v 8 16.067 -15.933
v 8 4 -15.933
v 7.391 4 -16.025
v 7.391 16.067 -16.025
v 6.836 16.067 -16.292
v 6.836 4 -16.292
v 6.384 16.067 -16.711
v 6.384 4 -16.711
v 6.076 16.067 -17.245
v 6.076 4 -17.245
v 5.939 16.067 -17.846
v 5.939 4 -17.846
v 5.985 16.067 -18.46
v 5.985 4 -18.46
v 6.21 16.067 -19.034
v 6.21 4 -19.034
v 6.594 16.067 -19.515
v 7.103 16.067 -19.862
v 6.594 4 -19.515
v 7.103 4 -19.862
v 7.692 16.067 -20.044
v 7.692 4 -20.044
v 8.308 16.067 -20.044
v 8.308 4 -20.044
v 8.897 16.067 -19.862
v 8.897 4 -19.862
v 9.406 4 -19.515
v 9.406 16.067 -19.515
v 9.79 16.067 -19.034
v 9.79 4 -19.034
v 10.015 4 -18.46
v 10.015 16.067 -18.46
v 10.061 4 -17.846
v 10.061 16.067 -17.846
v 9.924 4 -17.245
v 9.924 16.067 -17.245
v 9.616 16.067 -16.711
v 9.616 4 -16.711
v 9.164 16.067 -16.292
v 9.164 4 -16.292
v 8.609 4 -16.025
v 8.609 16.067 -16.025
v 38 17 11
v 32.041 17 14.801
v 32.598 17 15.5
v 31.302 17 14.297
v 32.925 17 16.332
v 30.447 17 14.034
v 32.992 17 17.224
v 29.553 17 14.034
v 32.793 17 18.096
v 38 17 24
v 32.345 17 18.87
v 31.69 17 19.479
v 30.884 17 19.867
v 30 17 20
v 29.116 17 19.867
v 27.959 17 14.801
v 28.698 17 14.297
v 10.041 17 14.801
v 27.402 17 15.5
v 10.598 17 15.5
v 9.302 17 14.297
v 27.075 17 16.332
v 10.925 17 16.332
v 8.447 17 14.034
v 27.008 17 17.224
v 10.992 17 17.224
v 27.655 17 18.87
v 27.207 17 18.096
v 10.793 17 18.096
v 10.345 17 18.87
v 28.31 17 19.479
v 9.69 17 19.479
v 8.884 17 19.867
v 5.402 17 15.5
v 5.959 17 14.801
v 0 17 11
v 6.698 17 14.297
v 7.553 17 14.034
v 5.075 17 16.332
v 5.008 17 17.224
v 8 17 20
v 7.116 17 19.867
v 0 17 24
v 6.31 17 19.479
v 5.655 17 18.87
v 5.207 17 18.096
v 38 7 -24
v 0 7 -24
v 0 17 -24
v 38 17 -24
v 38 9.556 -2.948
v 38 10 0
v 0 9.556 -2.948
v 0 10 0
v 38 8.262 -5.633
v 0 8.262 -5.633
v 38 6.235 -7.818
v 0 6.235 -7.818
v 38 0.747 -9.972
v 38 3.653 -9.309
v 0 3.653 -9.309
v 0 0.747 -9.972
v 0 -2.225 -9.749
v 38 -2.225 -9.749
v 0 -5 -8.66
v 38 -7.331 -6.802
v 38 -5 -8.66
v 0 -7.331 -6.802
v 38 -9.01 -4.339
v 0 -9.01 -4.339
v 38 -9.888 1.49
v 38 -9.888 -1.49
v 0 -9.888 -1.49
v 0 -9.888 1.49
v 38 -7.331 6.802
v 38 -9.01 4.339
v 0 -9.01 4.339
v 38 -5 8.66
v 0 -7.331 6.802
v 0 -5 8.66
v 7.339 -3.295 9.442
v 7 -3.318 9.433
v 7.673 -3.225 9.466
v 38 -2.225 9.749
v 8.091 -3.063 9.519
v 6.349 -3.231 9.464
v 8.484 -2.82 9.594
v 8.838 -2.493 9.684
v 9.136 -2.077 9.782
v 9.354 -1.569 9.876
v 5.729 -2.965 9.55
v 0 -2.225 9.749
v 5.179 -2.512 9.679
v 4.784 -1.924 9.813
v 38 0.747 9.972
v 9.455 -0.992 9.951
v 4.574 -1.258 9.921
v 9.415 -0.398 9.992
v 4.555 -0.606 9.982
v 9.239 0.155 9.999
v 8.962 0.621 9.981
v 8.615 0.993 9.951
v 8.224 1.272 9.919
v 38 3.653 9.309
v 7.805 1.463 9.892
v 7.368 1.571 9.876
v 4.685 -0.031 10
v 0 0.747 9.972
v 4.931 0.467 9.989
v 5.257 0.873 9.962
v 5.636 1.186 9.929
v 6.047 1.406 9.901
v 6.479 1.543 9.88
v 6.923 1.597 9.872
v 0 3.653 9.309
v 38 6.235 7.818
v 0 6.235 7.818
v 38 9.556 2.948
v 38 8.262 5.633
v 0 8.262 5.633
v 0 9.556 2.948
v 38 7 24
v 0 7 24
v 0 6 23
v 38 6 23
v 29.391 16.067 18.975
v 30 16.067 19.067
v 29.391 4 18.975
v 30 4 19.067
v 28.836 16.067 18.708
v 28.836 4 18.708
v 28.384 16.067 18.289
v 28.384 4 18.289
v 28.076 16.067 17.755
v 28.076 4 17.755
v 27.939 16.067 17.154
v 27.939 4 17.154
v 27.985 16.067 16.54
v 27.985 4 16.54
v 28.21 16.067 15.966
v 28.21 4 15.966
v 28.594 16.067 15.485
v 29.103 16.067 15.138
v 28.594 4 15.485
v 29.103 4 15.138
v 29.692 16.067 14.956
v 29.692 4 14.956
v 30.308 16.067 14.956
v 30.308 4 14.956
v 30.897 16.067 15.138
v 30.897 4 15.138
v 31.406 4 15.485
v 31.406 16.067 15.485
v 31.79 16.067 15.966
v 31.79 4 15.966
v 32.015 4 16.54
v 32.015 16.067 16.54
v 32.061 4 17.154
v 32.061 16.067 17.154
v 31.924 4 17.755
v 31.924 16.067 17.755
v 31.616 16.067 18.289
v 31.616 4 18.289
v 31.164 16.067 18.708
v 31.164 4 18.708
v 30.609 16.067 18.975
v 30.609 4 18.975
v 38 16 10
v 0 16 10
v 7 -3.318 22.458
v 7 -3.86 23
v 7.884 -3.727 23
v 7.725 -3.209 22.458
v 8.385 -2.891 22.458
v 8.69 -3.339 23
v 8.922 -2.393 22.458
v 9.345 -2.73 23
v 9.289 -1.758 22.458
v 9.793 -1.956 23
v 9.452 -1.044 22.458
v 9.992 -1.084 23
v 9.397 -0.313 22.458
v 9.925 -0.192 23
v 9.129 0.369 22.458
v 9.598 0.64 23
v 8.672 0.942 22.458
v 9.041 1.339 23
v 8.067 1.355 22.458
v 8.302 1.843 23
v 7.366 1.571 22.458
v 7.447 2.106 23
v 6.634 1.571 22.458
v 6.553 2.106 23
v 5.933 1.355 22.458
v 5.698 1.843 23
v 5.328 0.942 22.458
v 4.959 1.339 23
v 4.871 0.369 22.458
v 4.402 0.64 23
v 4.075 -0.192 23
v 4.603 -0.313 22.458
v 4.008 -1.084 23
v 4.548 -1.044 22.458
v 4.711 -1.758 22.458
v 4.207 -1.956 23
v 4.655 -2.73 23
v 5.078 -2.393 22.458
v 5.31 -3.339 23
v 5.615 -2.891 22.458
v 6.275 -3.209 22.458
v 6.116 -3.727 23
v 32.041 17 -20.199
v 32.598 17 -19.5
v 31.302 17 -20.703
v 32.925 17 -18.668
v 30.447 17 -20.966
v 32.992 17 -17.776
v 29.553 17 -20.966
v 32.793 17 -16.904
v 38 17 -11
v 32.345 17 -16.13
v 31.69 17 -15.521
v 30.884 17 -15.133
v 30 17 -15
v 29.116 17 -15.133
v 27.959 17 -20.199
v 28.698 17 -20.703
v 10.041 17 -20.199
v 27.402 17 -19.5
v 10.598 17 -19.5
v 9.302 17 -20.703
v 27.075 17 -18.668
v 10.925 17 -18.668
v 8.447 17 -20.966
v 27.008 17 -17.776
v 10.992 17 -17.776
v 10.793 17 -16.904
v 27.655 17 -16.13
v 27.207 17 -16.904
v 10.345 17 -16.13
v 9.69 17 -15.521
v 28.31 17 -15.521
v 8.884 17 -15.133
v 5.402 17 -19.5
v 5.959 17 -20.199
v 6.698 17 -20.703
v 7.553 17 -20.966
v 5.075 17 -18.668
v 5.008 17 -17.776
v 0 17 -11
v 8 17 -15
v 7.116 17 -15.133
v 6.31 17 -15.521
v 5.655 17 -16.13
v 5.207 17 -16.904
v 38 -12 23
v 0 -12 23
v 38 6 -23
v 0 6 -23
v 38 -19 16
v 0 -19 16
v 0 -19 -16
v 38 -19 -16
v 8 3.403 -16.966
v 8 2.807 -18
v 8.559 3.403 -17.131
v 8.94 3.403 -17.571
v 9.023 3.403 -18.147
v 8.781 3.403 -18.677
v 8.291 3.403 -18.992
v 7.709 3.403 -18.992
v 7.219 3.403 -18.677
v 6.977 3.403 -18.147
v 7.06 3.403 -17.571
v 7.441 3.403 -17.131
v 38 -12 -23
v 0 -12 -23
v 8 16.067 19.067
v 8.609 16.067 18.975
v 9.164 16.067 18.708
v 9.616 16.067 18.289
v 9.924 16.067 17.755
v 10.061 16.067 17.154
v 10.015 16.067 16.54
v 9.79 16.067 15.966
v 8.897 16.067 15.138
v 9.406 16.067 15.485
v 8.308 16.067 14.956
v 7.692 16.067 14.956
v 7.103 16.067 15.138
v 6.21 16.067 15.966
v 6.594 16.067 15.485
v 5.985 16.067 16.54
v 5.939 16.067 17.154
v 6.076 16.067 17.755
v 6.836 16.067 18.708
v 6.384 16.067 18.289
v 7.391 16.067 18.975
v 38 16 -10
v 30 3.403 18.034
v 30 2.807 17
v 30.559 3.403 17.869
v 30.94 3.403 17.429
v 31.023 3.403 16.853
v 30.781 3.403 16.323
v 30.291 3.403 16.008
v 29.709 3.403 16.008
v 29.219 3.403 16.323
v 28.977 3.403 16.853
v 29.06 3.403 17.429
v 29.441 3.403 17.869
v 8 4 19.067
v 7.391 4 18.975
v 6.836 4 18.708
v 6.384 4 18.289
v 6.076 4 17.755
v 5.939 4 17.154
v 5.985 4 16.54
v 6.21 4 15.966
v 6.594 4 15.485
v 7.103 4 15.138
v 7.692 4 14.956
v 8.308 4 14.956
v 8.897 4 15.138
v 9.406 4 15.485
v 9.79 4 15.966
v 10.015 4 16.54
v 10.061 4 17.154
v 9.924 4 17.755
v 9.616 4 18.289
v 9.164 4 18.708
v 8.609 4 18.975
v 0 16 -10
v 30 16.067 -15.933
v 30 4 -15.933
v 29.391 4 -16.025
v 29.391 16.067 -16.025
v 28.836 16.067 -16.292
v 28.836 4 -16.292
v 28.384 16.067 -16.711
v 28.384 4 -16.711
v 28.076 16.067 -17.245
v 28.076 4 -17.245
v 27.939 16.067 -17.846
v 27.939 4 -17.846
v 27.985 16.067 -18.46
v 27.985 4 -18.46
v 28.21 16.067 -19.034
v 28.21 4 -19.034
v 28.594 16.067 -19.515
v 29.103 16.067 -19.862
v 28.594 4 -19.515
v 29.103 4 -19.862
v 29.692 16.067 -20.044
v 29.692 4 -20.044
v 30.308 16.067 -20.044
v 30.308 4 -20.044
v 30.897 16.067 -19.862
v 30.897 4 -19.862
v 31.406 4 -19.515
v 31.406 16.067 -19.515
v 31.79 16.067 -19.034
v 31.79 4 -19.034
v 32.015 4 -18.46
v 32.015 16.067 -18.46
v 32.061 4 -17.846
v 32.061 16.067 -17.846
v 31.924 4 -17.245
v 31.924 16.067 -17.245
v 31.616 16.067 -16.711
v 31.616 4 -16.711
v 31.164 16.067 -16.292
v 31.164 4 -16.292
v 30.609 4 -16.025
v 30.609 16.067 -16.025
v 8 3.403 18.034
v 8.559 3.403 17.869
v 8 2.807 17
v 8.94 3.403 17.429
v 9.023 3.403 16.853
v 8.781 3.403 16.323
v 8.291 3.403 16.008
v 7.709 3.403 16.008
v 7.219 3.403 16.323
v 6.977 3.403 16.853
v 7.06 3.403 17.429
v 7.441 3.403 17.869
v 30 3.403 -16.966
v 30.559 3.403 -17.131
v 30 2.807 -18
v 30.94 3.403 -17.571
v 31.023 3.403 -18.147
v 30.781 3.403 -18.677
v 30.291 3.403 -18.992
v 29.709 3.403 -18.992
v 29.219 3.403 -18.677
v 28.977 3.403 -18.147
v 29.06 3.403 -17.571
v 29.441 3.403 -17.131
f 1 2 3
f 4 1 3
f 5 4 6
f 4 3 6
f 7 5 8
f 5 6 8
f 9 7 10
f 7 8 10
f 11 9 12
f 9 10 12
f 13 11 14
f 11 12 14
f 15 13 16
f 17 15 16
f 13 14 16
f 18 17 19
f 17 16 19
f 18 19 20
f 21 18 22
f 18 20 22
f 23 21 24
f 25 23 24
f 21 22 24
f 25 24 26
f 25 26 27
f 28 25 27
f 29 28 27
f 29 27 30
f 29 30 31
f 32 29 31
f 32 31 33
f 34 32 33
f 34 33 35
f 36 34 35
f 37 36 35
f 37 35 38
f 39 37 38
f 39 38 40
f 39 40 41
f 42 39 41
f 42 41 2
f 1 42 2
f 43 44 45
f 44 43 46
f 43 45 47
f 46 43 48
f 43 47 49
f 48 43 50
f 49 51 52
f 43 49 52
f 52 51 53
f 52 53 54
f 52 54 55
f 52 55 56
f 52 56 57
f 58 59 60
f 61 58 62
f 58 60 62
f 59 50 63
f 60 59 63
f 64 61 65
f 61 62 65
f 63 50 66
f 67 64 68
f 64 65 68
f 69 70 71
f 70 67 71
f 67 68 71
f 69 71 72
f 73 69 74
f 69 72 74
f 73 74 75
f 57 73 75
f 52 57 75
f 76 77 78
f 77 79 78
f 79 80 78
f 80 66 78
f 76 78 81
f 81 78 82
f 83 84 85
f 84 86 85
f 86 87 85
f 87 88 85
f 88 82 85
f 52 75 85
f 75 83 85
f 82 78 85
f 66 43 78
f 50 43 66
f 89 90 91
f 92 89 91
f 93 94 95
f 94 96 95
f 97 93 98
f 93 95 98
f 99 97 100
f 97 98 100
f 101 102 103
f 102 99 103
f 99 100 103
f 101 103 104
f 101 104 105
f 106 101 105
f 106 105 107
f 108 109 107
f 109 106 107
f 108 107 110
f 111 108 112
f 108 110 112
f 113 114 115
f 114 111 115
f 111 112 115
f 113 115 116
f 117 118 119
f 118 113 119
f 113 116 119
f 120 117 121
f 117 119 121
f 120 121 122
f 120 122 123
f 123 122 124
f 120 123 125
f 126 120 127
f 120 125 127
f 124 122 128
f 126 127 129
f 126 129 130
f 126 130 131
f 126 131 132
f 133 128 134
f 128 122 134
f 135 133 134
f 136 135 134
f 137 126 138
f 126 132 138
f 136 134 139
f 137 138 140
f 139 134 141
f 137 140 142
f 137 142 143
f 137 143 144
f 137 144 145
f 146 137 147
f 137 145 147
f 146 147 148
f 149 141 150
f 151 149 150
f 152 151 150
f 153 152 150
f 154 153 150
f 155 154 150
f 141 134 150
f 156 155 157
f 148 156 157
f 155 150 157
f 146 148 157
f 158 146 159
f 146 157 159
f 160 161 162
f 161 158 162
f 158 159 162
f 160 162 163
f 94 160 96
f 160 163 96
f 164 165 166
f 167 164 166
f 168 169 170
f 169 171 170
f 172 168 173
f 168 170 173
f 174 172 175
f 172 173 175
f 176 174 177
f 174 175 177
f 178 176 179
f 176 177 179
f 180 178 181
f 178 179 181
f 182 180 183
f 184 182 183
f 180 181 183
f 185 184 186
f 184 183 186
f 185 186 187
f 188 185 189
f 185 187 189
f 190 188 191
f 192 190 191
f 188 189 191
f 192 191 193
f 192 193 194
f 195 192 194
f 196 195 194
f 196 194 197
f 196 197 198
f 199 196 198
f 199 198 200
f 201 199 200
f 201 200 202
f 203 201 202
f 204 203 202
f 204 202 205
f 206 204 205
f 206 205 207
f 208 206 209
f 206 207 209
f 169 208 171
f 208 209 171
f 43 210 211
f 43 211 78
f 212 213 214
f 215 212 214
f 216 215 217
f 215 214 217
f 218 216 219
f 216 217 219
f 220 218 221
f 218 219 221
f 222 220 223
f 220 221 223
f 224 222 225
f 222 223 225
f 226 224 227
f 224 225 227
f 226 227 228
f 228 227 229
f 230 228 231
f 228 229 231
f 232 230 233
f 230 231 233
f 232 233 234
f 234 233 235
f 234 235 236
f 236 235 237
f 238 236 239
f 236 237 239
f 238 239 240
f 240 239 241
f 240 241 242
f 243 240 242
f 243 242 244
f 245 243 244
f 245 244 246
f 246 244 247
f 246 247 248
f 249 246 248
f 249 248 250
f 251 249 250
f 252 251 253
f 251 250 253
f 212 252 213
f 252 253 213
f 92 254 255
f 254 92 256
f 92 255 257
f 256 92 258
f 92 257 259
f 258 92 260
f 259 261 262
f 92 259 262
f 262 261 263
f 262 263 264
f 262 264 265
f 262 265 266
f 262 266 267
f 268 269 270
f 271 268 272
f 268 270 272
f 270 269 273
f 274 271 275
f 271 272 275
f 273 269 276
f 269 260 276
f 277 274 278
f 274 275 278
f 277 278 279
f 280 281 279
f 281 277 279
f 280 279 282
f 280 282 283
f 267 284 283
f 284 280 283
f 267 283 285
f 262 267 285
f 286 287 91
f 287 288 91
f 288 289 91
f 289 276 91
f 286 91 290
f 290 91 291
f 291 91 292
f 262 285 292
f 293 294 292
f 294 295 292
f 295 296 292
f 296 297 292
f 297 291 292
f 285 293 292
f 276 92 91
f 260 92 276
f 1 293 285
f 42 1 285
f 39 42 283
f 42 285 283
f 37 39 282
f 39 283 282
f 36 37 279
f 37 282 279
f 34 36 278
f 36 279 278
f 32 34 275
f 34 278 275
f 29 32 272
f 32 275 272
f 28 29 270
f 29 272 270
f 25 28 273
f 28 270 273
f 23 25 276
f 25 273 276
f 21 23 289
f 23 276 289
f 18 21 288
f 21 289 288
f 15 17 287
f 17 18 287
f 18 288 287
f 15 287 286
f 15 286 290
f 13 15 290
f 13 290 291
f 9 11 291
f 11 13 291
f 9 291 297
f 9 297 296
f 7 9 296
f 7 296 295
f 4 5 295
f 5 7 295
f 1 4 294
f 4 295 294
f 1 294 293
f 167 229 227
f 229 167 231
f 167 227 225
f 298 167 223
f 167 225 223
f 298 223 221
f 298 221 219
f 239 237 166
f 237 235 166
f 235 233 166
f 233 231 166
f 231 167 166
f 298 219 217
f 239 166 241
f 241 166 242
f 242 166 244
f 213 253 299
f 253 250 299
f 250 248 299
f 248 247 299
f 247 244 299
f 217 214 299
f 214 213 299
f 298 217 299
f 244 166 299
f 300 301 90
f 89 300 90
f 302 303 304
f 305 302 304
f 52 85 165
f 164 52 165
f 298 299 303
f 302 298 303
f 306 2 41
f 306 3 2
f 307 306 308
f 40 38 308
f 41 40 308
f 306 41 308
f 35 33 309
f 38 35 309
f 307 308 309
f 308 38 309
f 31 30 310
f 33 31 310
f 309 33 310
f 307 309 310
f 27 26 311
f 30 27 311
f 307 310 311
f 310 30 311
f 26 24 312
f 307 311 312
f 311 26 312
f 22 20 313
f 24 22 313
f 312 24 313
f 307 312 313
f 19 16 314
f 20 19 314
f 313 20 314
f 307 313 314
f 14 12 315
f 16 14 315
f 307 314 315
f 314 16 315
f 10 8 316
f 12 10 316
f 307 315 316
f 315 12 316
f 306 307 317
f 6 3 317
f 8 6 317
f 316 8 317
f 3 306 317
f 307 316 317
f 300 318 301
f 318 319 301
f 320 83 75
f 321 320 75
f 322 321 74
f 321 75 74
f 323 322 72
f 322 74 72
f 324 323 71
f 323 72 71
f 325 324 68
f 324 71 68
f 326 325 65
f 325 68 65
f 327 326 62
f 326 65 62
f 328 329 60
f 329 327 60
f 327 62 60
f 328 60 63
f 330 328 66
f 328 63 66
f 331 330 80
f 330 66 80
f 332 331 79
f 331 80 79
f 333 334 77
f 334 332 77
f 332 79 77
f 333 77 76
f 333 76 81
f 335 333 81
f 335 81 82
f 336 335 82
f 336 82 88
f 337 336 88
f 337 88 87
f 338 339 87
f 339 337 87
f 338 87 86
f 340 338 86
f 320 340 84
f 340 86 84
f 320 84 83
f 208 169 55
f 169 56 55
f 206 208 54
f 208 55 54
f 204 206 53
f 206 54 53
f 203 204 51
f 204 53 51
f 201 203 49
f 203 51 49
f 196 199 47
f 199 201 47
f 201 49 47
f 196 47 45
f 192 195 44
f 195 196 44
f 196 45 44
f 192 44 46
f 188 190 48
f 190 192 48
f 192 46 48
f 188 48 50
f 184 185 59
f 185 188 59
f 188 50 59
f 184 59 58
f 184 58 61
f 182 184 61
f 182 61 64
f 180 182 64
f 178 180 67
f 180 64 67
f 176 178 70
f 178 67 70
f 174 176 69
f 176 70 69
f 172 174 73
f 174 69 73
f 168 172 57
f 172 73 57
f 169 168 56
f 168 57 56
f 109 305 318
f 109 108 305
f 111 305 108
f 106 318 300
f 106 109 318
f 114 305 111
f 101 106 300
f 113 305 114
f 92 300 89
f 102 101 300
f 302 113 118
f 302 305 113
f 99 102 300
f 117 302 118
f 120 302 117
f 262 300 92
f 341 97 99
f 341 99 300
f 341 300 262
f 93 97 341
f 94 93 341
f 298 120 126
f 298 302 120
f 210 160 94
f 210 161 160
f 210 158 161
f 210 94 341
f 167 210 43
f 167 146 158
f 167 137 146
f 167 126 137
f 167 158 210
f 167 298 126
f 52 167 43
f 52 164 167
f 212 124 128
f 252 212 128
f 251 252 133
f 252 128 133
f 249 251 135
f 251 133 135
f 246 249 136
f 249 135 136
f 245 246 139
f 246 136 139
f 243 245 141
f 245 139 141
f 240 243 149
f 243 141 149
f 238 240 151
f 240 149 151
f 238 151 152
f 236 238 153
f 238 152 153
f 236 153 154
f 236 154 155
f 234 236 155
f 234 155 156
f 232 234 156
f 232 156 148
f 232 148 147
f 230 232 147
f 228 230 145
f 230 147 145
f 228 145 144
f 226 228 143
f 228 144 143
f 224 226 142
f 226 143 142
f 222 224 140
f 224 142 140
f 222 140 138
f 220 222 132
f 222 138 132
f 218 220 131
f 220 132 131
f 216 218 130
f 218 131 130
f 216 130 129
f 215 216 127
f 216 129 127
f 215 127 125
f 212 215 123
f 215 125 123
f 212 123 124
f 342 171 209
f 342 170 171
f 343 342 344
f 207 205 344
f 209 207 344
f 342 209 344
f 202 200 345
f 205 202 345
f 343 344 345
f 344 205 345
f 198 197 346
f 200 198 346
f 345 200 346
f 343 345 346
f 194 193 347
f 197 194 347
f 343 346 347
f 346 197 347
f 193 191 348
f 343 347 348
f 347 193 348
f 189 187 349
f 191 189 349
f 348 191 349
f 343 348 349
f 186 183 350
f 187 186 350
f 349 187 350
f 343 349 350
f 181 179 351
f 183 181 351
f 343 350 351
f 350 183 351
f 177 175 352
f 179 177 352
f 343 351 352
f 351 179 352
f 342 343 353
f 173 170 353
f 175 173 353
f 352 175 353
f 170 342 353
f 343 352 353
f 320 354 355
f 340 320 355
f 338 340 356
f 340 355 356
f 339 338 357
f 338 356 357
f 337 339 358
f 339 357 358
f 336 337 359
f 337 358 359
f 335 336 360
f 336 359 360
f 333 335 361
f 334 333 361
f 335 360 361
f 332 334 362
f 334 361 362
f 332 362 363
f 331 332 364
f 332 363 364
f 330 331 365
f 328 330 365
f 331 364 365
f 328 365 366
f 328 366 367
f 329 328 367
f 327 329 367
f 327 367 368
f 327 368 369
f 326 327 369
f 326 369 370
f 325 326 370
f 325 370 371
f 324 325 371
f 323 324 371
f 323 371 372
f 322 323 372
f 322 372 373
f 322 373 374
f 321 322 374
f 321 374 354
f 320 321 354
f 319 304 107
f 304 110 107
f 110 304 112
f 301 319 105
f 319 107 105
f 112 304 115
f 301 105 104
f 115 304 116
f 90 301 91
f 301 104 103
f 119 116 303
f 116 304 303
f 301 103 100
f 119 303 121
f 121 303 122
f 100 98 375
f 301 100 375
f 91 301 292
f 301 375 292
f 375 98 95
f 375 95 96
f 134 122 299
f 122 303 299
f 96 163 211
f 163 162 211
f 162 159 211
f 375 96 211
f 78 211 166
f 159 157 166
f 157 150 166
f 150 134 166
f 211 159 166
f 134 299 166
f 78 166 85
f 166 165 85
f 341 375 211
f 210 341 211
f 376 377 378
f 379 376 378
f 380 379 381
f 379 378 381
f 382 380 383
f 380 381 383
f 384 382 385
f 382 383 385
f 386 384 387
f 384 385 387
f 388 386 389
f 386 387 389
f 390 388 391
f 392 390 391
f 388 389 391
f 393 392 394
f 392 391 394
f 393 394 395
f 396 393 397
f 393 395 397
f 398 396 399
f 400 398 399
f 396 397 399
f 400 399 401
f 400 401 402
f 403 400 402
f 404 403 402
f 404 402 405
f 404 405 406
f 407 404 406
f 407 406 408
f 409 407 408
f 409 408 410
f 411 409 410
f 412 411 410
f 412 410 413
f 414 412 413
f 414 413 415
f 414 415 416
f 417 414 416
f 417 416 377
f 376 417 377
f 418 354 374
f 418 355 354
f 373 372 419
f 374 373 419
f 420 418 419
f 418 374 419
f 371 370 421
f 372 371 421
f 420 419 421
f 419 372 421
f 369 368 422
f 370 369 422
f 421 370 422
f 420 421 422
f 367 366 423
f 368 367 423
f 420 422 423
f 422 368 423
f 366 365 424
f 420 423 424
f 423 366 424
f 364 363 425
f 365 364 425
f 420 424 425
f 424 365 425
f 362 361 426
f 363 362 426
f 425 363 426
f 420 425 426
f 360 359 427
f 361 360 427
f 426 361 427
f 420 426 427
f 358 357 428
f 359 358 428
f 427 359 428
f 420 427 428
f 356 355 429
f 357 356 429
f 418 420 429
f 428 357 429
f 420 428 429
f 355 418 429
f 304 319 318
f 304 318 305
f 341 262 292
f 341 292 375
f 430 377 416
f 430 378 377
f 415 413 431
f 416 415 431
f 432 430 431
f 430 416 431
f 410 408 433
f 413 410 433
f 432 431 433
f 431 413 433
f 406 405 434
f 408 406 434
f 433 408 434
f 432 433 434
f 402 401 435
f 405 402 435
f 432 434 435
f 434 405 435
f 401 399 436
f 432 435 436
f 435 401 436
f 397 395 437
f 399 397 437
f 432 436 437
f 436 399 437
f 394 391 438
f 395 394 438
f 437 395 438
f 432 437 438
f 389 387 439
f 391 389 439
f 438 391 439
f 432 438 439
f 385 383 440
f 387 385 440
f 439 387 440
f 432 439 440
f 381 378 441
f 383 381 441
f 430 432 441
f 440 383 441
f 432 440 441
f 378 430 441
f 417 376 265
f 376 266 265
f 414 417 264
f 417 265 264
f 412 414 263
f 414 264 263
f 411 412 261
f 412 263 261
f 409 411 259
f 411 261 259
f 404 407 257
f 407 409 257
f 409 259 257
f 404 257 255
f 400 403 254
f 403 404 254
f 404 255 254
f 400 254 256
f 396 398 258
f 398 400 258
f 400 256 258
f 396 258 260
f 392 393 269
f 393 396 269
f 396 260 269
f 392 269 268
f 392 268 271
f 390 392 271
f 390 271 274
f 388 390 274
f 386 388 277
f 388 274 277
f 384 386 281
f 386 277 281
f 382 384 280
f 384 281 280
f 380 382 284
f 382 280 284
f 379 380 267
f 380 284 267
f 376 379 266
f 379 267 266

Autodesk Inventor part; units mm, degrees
sketch "Sketch_1" plane through (0, 0, 0) normal (1, 0, 0) x (0, 1, 0)
  line L0 (17, 24) -> (7, 24)
  line L1 (7, 24) -> (6, 23)
  line L2 (6, 23) -> (-12, 23)
  line L3 (-19, 16) -> (-19, -16)
  line L4 (-12, -23) -> (6, -23)
  line L5 (6, -23) -> (7, -24)
  line L6 (7, -24) -> (17, -24)
  line L7 (17, -24) -> (17, -11)
  line L8 (17, -11) -> (16, -10)
  line L9 (16, -10) -> (16, 10)
  line L10 (16, 10) -> (17, 11)
  line L11 (17, 11) -> (17, 24)
  circle A0 centre (0, 0) radius 10
  line L12 (16, 0) -> (0, 0) construction
  line L13 (-12, -23) -> (-19, -16)
  line L14 (-12, 23) -> (-19, 16)
  line L15 (0, 0) -> (-19, 0) construction
  line L16 (6, 23) -> (6, -23) construction
  dimension "d39" = 20
  dimension "d41" = 46
  dimension "d43" = 23
  dimension "d45" = 1
  dimension "d46" = 48
  dimension "d47" = 1
  dimension "d48" = 36
  dimension "d49" = 10
  dimension "d50" = 10
  dimension "d51" = 20
  dimension "d52" = 13
  dimension "d53" = 13
  dimension "d54" = 32
  dimension "d55" = 16
  dimension "d56" = 135
  dimension "d57" = 18
  dimension "d58" = 18
extrude "Extrusion1" add sketch "Sketch_1" along normal blind 38
sketch "Sketch_2" plane through (29, 0, 0) normal (0.682, 0, 0.7314) x (0.7314, 0, -0.682)
  line L0 (-29, -24.55) -> (-4.4539, -24.55)
  arc A0 (-4.4539, -24.55) -> (4.4539, -24.55) centre (0, -23.4) ccw
  line L1 (4.4539, -24.55) -> (29, -24.55)
  line L2 (29, -24.55) -> (29, -23.4)
  line L3 (29, -23.4) -> (-29, -23.4)
  line L4 (-29, -23.4) -> (-29, -24.55)
  dimension "d33" = 58
  dimension "d34" = 1.15
  dimension "d35" = 24.5461
  dimension "d36" = 4.6
  dimension "d37" = 24.5461
  dimension "d38" = 1.15
extrude "Extrusion2" [suppressed]
sketch "Sketch_3" plane through (0, -23.4, 0) normal (0, 1, 0) x (1, 0, 0)
  line L0 (-29, -58) -> (87, -58)
  line L1 (87, -58) -> (87, 58)
  line L2 (87, 58) -> (-29, 58)
  line L3 (-29, 58) -> (-29, -58)
  line L4 (9.6667, -9.44) -> (48.3333, -9.44)
  line L5 (48.3333, -9.44) -> (48.3333, 9.44)
  line L6 (48.3333, 9.44) -> (9.6667, 9.44)
  line L7 (9.6667, 9.44) -> (9.6667, -9.44)
extrude "Extrusion3" [suppressed]
sketch "Sketch_4" plane through (0, 0, 0) normal (0, 0, 1) x (1, 0, 0)
  line L0 (13.4367, -26.15) -> (13.4367, -24.55)
  line L1 (13.4367, -24.55) -> (15.4367, -24.55)
  line L2 (15.4367, -24.55) -> (15.4367, -25.75)
  arc A0 (15.0367, -26.15) -> (15.4367, -25.75) centre (15.0367, -25.75) ccw
  line L3 (15.0367, -26.15) -> (13.4367, -26.15)
  line L4 (13.4367, -26.15) -> (13.4367, -24.55)
revolve "Revolution1" [suppressed]
sketch "Sketch_5" plane through (0, 0, 0) normal (0, 0, 1) x (1, 0, 0)
  line L0 (44.5633, -26.15) -> (44.5633, -24.55)
  line L1 (44.5633, -24.55) -> (46.5633, -24.55)
  line L2 (46.5633, -24.55) -> (46.5633, -25.75)
  arc A0 (46.1633, -26.15) -> (46.5633, -25.75) centre (46.1633, -25.75) ccw
  line L3 (46.1633, -26.15) -> (44.5633, -26.15)
  line L4 (44.5633, -26.15) -> (44.5633, -24.55)
revolve "Revolution2" [suppressed]
sketch "Sketch_6" plane through (0, -26.15, 0) normal (0, 1, 0) x (1, 0, 0)
  line L0 (43.5633, 0.15) -> (43.5633, -0.15)
  line L1 (43.5633, -0.15) -> (44.4133, -0.15)
  line L2 (44.4133, -0.15) -> (44.4133, -1)
  line L3 (44.4133, -1) -> (44.7133, -1)
  line L4 (44.7133, -1) -> (44.7133, -0.15)
  line L5 (44.7133, -0.15) -> (45.5633, -0.15)
  line L6 (45.5633, -0.15) -> (45.5633, 0.15)
  line L7 (45.5633, 0.15) -> (44.7133, 0.15)
  line L8 (44.7133, 0.15) -> (44.7133, 1)
  line L9 (44.7133, 1) -> (44.4133, 1)
  line L10 (44.4133, 1) -> (44.4133, 0.15)
  line L11 (44.4133, 0.15) -> (43.5633, 0.15)
extrude "Extrusion4" [suppressed]
sketch "Sketch_7" plane through (0, -26.15, 0) normal (0, 1, 0) x (1, 0, 0)
  line L0 (12.4367, 0.15) -> (12.4367, -0.15)
  line L1 (12.4367, -0.15) -> (13.2867, -0.15)
  line L2 (13.2867, -0.15) -> (13.2867, -1)
  line L3 (13.2867, -1) -> (13.5867, -1)
  line L4 (13.5867, -1) -> (13.5867, -0.15)
  line L5 (13.5867, -0.15) -> (14.4367, -0.15)
  line L6 (14.4367, -0.15) -> (14.4367, 0.15)
  line L7 (14.4367, 0.15) -> (13.5867, 0.15)
  line L8 (13.5867, 0.15) -> (13.5867, 1)
  line L9 (13.5867, 1) -> (13.2867, 1)
  line L10 (13.2867, 1) -> (13.2867, 0.15)
  line L11 (13.2867, 0.15) -> (12.4367, 0.15)
extrude "Extrusion5" [suppressed]
sketch "Sketch8" plane through (0, -12, 23) normal (0, 0, 1) x (1, 0, 0)
  line L0 (0, 18) -> (0, 0) projected
  point P0 (7, 11.14)
  dimension "d61" = 7
hole "Hole1" at (7, -0.86, 23) direction (0, 0, -1) diameter 4.917 depth 14.1406 tip angle 120 countersink diameter 6 countersink angle 90 thread size "M6x1" class "6H" standard "ISO Metric profile"
sketch "Sketch9" plane through (0, 17, -11) normal (0, 1, 0) x (1, 0, 0)
  line L0 (0, 13) -> (0, 0) projected
  line L1 (0, 13) -> (38, 13) projected
  point P0 (8, 7)
  dimension "d59" = 8
  dimension "d60" = 6
hole "Hole2" at (8, 17, -18) direction (0, -1, 0) diameter 4.134 depth 13 tip angle 120 countersink diameter 6 countersink angle 90 thread size "M5x0.8" class "6H" standard "ISO Metric profile"
pattern_linear "Rectangular Pattern1" count 2 spacing 22 along (1, 0, 0) count 2 spacing 35 along (0, 0, 1) of "Hole2"
ref_plane "bnt_nut_1_XY" through (0, 0, 0) normal (1, 0, 0) x (0, 0, -1)
ref_plane "bnt_nut_1_YZ" through (0, 0, 0) normal (0, 0, -1) x (0, 1, 0)
ref_plane "bnt_nut_1_ZX" through (0, 0, 0) normal (0, 1, 0) x (1, 0, 0)
sketch "Sketch10" plane through (38, -23.4, -9.44) normal (0, 0, -1) x (-1, 0, 0)
  point P0 (38, 23.4)
sketch "Sketch11" plane through (38, 0, 0) normal (1, 0, 0) x (0, 0, -1)
  circle A0 centre (0, 0) radius 15.5
  dimension "d62" = 31
properties part number "BNT 2010-2.6 Nut"
